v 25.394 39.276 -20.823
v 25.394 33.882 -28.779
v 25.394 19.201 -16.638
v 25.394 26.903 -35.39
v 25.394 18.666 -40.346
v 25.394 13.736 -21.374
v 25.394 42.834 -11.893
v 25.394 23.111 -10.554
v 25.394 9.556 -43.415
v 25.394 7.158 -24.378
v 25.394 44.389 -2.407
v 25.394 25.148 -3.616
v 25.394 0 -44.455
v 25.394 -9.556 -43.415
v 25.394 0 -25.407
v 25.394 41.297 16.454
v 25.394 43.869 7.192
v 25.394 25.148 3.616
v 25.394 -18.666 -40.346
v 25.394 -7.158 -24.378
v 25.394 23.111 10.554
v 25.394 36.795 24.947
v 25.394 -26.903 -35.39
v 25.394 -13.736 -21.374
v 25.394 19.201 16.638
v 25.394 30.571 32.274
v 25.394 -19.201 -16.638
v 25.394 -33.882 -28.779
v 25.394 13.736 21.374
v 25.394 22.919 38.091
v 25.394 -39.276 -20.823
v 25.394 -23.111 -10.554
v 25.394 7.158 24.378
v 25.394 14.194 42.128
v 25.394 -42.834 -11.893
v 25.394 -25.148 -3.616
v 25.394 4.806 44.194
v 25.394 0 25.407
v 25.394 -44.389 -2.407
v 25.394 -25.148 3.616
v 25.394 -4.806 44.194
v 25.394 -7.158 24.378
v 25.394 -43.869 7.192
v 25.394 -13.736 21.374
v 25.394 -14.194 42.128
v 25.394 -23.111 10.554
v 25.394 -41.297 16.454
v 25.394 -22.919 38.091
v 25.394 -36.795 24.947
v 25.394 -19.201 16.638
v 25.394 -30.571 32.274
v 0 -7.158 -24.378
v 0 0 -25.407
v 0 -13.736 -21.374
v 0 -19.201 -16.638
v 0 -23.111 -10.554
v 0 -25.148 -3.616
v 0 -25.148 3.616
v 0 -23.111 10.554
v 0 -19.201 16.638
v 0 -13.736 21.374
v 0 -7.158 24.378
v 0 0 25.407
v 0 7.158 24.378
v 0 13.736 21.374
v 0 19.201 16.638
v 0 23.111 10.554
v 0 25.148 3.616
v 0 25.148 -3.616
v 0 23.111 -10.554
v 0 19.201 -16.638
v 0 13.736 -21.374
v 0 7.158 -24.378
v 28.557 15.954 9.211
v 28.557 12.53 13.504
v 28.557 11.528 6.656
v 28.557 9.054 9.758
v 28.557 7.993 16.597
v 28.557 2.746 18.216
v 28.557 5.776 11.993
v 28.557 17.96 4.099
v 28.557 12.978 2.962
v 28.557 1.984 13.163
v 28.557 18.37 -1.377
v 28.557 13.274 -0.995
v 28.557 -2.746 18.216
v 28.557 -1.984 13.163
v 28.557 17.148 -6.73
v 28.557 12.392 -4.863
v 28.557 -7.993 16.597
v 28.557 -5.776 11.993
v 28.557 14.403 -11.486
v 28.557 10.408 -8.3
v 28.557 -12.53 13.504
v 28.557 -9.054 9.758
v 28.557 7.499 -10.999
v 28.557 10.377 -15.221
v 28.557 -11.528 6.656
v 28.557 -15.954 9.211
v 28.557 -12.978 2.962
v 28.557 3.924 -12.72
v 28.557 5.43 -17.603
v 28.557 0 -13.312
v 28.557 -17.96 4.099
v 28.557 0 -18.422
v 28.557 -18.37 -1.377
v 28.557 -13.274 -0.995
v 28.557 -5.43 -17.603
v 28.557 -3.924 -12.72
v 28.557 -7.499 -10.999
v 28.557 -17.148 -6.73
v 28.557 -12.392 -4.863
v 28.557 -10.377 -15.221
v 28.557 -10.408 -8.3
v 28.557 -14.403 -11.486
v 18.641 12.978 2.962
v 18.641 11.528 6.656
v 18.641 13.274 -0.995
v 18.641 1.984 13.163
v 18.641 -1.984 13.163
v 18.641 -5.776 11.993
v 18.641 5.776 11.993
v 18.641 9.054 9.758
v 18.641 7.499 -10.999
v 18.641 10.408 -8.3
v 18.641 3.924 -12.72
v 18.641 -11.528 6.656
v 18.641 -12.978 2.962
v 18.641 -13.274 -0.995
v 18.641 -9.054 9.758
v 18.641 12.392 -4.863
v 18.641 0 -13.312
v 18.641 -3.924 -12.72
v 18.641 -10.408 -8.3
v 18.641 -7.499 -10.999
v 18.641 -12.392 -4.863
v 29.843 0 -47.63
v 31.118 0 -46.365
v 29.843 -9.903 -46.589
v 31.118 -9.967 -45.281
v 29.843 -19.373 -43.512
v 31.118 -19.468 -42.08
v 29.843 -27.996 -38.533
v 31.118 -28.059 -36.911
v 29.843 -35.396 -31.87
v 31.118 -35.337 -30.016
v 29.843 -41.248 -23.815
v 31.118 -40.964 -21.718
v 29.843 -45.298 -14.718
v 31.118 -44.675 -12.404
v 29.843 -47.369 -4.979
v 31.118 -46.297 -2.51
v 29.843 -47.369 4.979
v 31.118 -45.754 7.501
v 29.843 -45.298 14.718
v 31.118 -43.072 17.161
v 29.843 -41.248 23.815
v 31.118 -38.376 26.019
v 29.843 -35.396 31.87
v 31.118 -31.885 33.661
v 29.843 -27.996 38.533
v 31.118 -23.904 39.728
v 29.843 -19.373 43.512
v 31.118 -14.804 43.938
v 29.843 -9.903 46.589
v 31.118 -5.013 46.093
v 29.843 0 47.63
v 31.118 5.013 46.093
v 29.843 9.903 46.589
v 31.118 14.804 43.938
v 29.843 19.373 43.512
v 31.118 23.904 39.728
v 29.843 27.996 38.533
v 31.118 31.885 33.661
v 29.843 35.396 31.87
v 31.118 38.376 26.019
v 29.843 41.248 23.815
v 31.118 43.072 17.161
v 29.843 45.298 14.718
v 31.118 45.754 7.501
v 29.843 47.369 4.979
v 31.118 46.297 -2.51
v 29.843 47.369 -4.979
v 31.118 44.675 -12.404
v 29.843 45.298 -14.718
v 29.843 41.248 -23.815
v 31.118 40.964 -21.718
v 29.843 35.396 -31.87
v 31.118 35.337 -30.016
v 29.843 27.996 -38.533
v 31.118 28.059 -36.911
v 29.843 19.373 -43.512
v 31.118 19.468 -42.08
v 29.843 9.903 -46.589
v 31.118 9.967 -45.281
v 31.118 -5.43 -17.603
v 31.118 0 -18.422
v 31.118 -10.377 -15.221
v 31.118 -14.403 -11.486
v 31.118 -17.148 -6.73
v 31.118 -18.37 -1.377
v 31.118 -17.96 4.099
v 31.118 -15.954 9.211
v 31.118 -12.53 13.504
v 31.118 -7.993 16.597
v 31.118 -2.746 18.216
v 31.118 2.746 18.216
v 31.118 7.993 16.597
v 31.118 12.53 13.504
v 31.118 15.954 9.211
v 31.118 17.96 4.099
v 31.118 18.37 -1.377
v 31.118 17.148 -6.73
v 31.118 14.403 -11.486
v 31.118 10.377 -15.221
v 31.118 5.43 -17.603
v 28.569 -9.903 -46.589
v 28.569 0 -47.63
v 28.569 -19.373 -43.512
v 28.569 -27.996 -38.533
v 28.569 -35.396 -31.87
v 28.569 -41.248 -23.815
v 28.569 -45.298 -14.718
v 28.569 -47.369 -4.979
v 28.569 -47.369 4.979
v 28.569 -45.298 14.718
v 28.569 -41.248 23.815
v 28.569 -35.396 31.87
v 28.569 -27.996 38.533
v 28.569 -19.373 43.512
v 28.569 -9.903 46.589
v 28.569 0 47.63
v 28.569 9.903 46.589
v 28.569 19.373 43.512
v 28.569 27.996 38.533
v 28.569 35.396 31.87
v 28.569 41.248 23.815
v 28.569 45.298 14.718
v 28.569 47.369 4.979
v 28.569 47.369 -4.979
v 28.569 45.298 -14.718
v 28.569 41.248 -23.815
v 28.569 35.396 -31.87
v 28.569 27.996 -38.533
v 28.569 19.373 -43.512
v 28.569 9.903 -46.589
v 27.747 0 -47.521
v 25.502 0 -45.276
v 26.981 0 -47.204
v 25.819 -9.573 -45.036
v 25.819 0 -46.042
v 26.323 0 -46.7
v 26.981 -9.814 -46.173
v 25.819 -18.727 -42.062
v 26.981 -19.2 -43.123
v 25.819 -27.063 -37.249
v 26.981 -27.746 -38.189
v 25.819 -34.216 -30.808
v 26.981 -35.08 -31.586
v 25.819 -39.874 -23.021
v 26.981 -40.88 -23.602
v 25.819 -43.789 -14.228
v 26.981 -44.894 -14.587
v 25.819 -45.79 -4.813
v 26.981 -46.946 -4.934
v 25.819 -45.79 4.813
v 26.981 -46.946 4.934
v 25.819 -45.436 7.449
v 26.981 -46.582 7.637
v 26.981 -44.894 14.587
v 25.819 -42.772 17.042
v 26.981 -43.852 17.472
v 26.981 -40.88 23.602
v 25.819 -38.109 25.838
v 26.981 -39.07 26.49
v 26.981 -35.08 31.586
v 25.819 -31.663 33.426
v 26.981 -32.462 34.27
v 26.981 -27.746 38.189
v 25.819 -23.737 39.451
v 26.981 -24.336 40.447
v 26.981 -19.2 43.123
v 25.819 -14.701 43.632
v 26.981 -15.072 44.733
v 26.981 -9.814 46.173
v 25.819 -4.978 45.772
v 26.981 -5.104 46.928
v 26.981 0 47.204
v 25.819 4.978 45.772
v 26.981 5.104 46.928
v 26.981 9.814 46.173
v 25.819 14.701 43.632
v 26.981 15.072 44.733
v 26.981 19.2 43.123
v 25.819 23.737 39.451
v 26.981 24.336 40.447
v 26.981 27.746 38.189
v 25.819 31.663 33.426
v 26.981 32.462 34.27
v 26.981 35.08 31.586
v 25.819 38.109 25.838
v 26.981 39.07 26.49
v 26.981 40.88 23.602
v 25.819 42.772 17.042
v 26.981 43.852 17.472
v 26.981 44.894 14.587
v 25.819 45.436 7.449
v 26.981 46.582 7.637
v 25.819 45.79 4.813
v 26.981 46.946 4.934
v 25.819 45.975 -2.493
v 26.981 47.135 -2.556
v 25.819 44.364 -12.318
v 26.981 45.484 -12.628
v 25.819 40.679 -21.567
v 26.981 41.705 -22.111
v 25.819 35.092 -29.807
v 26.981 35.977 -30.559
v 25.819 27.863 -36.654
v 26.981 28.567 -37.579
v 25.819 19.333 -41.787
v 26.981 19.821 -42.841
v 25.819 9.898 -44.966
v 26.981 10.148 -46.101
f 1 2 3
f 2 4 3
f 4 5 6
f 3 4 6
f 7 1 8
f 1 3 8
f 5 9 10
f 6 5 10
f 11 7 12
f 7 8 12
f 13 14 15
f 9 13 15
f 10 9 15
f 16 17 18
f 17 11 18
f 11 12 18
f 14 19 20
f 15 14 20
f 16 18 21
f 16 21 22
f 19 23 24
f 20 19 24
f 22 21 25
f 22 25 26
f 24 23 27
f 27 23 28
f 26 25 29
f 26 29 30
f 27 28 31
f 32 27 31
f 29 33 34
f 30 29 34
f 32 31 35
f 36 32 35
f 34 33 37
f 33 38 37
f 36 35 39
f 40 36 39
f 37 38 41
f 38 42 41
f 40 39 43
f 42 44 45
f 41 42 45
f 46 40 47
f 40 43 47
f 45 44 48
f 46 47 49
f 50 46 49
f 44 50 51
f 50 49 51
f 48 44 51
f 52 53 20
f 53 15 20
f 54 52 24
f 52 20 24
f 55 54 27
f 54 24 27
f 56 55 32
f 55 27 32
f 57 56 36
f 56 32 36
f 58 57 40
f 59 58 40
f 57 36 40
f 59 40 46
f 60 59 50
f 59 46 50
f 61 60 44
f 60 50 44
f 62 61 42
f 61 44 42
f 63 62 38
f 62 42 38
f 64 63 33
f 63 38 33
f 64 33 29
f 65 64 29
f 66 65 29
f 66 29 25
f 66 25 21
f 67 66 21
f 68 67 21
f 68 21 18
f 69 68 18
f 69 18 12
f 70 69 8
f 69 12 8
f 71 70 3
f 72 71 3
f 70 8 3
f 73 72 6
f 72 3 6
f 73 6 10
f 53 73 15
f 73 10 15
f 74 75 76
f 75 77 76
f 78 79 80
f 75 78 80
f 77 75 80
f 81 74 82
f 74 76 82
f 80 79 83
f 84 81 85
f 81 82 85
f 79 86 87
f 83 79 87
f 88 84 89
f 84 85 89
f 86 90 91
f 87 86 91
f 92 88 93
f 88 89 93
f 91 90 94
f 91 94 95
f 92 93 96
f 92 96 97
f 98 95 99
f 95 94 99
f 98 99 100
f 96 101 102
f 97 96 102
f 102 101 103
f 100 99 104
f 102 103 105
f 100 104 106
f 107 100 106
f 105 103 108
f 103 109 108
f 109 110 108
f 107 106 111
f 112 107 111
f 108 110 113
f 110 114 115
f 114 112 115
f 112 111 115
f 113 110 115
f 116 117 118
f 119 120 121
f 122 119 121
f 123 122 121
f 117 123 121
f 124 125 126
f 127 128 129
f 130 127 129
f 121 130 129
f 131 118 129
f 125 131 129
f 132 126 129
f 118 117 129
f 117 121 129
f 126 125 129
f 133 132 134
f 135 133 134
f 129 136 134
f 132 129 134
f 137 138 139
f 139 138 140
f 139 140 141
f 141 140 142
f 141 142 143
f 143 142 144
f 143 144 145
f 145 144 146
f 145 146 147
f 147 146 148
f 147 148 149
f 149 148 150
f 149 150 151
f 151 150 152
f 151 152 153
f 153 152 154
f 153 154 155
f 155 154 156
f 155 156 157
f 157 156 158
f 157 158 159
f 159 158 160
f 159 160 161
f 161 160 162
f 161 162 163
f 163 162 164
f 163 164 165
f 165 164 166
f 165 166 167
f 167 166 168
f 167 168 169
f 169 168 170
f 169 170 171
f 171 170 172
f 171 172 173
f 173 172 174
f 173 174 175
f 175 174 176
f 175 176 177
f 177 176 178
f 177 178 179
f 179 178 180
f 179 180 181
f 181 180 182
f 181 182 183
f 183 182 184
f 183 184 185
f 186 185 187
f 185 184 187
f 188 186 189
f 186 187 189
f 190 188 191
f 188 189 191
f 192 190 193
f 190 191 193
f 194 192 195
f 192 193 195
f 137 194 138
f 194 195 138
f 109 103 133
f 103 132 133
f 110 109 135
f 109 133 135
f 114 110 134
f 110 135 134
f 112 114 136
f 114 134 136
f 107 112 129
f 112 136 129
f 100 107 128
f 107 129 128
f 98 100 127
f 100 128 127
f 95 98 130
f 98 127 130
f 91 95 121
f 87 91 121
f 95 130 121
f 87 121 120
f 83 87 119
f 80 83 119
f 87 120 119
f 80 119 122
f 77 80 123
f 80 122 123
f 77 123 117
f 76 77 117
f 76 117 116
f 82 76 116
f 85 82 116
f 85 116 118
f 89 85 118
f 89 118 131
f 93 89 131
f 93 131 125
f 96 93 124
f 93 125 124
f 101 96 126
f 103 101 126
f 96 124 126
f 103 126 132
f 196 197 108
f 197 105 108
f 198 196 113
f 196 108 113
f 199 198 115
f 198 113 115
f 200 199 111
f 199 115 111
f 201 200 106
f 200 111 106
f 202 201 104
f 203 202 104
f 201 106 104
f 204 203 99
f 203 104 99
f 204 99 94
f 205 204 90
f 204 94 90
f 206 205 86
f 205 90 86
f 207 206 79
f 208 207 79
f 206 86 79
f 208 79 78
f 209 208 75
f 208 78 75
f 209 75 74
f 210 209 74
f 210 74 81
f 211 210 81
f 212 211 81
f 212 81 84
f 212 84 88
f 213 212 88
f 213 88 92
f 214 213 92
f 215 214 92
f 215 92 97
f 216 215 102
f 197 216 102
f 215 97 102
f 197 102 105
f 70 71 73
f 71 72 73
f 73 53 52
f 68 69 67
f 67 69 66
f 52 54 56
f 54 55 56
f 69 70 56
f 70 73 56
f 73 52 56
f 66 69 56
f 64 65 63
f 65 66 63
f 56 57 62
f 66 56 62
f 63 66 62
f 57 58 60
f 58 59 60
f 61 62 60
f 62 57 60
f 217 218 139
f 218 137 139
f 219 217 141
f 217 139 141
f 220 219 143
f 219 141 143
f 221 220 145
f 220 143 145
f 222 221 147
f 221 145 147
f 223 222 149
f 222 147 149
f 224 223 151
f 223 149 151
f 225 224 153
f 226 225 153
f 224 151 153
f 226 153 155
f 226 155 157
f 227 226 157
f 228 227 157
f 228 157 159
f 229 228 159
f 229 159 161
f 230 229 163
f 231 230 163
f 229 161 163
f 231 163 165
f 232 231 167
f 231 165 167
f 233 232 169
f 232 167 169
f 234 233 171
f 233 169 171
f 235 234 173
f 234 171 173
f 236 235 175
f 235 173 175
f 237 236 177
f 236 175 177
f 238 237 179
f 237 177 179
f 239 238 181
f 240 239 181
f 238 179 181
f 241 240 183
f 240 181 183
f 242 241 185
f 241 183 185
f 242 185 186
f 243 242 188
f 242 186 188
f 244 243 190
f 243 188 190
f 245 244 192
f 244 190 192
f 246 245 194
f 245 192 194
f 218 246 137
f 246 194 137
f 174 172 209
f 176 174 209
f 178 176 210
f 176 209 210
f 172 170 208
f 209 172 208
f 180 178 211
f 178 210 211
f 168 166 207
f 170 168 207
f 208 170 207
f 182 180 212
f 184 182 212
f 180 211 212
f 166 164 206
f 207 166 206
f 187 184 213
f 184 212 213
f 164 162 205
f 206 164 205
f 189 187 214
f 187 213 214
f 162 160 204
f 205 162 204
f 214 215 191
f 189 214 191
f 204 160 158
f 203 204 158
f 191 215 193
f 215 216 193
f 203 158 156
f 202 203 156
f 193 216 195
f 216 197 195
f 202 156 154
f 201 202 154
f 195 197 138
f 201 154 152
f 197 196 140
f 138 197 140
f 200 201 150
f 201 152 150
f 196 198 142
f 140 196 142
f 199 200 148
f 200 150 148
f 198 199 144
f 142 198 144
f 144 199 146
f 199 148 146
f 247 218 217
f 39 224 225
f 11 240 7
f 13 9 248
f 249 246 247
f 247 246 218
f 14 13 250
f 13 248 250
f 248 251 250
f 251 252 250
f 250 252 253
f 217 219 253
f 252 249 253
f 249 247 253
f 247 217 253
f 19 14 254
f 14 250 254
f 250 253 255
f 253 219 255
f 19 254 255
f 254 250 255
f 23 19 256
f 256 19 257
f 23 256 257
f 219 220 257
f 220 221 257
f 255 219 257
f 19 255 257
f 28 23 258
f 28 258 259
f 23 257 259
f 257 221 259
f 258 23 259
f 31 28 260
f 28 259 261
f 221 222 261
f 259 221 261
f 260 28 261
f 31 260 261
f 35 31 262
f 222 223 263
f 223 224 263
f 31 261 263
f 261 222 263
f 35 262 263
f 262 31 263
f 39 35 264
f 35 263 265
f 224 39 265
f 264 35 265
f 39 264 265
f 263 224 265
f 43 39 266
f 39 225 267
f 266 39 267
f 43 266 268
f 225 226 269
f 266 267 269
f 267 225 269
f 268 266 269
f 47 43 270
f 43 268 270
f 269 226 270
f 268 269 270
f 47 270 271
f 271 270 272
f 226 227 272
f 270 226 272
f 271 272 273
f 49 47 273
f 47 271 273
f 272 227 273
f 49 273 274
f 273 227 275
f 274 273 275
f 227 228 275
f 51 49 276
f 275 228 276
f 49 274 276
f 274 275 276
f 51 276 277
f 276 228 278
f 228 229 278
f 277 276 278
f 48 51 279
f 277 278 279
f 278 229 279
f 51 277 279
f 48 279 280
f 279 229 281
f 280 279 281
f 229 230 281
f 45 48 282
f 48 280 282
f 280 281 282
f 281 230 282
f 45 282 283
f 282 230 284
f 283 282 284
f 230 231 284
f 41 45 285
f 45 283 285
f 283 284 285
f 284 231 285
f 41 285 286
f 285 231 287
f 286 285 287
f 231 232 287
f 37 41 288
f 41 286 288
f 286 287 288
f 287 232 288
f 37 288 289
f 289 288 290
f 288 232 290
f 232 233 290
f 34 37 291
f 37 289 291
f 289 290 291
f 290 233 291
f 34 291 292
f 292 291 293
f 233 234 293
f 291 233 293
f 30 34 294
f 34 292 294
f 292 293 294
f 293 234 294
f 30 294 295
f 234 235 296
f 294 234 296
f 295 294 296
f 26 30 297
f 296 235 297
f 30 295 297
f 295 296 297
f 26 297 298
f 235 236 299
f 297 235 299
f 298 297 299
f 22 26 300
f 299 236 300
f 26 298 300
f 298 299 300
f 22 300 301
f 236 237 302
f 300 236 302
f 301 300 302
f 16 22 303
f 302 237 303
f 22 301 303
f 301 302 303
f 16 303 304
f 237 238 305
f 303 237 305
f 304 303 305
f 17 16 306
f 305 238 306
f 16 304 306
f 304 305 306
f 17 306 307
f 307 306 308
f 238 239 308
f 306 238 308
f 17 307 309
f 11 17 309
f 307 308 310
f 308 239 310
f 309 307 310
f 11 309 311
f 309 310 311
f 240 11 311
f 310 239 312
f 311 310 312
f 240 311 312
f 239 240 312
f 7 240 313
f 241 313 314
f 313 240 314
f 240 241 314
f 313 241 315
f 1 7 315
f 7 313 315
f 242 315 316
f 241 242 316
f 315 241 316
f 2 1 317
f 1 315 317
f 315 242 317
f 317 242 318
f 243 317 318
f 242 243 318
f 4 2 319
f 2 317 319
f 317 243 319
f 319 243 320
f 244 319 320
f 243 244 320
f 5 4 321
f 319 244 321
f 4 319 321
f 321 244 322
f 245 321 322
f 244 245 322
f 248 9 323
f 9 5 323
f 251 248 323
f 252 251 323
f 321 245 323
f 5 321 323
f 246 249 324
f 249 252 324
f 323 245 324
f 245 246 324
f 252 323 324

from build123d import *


with BuildPart() as f1:
    # F0 (on Front) → F1 (revolve)
    with BuildSketch(Plane.XZ):
        with BuildLine():
            Line((18.64121, 0), (0, 0))
            Line((0, 0), (0, -25.406862))
            Line((0, -25.406862), (25.393533, -25.406862))
            Line((25.393533, -25.406862), (25.393533, -44.454585))
            ThreePointArc((25.393533, -44.454585), (26.323469, -46.699649), (28.568533, -47.629585))
            Line((28.568533, -47.629585), (29.843302, -47.629585))
            Line((29.843302, -47.629585), (31.11807, -46.364747))
            Line((31.11807, -46.364747), (31.11807, -18.42168))
            Line((31.11807, -18.42168), (28.557492, -18.42168))
            Line((28.557492, -18.42168), (28.557492, -13.31171))
            Line((28.557492, -13.31171), (18.64121, -13.31171))
            Line((18.64121, -13.31171), (18.64121, 0))
        make_face()
    revolve(axis=Axis((9.320605, 0, 0), (-1, 0, 0)))


solid = f1.part
